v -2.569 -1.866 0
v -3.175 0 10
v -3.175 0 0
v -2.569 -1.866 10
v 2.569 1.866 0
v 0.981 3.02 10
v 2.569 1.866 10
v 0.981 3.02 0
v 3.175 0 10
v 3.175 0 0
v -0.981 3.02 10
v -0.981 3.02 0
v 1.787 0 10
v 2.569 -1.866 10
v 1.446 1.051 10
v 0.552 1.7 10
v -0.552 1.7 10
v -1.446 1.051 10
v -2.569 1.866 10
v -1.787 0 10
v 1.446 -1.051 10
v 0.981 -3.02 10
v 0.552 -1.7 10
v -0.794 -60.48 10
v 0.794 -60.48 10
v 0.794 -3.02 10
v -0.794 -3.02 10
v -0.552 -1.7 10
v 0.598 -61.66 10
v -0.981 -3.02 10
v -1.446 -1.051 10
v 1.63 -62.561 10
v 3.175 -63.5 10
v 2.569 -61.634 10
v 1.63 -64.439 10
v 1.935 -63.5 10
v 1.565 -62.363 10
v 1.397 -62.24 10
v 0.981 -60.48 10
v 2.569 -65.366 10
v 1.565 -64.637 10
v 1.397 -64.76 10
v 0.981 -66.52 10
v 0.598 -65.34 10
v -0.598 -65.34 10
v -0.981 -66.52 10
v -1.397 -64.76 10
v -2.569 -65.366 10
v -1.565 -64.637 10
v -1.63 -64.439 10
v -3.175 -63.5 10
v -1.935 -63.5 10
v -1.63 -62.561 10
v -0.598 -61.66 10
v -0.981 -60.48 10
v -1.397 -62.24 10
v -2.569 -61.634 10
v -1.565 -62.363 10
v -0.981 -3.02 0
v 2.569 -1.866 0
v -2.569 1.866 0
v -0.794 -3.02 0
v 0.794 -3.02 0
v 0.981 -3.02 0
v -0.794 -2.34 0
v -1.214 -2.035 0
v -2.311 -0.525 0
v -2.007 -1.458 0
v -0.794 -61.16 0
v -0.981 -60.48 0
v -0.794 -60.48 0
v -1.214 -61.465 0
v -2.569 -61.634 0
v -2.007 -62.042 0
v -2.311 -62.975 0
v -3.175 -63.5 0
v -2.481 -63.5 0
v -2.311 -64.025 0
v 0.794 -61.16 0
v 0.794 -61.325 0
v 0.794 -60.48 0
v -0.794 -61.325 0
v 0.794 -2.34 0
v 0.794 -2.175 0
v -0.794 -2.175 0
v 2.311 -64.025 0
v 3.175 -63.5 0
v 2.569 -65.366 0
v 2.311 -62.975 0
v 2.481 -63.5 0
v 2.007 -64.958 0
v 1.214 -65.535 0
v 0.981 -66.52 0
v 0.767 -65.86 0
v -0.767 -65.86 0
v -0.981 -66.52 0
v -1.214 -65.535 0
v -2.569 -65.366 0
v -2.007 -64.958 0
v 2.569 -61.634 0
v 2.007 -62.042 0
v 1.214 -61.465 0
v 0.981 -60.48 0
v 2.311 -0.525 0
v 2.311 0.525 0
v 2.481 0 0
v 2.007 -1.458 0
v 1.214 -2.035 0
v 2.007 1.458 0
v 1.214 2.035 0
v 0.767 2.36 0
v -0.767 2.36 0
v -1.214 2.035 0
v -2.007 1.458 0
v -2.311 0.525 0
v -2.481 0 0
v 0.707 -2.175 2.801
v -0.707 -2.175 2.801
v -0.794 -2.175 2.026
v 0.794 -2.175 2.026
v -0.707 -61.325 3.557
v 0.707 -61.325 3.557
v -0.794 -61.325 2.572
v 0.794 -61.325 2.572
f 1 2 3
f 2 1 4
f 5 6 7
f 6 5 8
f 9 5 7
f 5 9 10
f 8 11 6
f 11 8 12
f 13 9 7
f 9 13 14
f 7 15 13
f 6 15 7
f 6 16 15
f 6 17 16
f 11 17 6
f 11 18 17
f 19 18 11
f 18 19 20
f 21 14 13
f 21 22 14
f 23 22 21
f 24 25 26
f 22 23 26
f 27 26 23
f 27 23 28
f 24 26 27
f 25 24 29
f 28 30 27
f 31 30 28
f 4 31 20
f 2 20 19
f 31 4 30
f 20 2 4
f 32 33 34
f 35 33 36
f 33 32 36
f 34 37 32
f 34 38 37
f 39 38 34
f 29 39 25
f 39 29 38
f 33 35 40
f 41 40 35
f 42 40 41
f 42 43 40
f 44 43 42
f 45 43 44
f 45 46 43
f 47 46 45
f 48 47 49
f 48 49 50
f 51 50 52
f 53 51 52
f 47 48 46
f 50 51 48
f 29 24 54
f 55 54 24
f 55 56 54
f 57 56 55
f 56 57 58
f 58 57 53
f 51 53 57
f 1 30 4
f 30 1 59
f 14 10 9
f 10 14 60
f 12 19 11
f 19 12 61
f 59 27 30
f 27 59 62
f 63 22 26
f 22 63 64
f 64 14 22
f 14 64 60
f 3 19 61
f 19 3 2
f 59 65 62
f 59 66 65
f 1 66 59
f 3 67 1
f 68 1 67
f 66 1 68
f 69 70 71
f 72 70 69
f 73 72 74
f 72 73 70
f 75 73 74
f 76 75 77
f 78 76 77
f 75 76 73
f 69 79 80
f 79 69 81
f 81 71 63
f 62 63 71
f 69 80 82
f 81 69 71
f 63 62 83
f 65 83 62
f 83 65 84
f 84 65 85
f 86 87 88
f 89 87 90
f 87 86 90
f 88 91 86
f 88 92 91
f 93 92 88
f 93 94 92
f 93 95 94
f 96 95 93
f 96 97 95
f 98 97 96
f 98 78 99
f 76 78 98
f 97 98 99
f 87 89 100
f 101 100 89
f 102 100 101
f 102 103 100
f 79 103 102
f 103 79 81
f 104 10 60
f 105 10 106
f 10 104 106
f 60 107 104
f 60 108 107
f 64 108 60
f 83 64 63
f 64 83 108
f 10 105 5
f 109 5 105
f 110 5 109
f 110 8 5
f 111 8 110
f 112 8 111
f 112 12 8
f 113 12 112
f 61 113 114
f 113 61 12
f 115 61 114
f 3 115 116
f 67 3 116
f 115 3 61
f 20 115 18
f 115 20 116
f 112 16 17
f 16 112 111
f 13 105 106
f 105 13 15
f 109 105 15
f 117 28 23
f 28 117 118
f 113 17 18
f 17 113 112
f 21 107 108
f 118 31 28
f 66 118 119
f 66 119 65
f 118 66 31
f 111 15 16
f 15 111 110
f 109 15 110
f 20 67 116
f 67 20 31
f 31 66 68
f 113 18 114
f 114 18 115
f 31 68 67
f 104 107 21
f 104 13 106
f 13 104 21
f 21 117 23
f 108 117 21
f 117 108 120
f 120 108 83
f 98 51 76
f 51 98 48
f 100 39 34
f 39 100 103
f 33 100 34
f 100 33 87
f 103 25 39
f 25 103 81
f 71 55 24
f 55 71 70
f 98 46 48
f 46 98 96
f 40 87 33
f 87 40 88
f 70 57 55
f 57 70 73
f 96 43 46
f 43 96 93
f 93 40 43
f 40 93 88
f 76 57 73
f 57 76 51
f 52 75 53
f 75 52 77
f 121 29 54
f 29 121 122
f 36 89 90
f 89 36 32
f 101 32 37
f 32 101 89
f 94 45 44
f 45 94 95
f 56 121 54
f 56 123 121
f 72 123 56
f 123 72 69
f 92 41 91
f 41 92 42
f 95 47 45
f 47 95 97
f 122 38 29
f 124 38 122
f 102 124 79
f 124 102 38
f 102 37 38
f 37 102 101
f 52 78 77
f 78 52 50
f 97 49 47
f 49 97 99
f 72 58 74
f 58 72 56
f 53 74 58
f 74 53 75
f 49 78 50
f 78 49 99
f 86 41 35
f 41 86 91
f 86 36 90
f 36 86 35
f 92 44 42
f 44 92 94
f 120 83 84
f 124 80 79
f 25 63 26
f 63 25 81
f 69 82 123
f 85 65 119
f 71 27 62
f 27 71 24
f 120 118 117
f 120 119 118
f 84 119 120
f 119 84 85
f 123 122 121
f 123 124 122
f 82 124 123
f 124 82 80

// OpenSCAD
myinch = 25.4;
//module mypole() {
//	cylinder (r1=myinch/8,r2=myinch/8,myinch/8);
//	cylinder (r1=myinch/16,r2=myinch/16-0.2,3/2*myinch);
//}
//translate(v=[myinch/4,-myinch/4,7]) { mypole();}
//translate(v=[myinch/4,-11*myinch/4,7]) { mypole();}
//include <3x3Straight_auto_0.scad>;

module mybanner() {
	bheight=10;
	union() {
		difference() {
			cylinder (r1=myinch/8,r2=myinch/8,bheight);
			translate(v=[0,0,-bheight]) { cylinder (r1=myinch/8,r2=myinch/16+0.2,2*bheight); }
		}
		translate(v=[0,-10*myinch/4]) {
			difference() {
				cylinder (r1=myinch/8,r2=myinch/8,bheight);
				translate(v=[0,0,-myinch/2]) { cylinder (r1=myinch/8,r2=myinch/16+0.2,myinch); }
			}
		}
        	translate(v=[-myinch/32,-9*myinch/4-myinch/8-1,0]) {
			cube(size=[myinch/16,9*myinch/4+2,bheight]);
        	}
	}
}

mybanner();
